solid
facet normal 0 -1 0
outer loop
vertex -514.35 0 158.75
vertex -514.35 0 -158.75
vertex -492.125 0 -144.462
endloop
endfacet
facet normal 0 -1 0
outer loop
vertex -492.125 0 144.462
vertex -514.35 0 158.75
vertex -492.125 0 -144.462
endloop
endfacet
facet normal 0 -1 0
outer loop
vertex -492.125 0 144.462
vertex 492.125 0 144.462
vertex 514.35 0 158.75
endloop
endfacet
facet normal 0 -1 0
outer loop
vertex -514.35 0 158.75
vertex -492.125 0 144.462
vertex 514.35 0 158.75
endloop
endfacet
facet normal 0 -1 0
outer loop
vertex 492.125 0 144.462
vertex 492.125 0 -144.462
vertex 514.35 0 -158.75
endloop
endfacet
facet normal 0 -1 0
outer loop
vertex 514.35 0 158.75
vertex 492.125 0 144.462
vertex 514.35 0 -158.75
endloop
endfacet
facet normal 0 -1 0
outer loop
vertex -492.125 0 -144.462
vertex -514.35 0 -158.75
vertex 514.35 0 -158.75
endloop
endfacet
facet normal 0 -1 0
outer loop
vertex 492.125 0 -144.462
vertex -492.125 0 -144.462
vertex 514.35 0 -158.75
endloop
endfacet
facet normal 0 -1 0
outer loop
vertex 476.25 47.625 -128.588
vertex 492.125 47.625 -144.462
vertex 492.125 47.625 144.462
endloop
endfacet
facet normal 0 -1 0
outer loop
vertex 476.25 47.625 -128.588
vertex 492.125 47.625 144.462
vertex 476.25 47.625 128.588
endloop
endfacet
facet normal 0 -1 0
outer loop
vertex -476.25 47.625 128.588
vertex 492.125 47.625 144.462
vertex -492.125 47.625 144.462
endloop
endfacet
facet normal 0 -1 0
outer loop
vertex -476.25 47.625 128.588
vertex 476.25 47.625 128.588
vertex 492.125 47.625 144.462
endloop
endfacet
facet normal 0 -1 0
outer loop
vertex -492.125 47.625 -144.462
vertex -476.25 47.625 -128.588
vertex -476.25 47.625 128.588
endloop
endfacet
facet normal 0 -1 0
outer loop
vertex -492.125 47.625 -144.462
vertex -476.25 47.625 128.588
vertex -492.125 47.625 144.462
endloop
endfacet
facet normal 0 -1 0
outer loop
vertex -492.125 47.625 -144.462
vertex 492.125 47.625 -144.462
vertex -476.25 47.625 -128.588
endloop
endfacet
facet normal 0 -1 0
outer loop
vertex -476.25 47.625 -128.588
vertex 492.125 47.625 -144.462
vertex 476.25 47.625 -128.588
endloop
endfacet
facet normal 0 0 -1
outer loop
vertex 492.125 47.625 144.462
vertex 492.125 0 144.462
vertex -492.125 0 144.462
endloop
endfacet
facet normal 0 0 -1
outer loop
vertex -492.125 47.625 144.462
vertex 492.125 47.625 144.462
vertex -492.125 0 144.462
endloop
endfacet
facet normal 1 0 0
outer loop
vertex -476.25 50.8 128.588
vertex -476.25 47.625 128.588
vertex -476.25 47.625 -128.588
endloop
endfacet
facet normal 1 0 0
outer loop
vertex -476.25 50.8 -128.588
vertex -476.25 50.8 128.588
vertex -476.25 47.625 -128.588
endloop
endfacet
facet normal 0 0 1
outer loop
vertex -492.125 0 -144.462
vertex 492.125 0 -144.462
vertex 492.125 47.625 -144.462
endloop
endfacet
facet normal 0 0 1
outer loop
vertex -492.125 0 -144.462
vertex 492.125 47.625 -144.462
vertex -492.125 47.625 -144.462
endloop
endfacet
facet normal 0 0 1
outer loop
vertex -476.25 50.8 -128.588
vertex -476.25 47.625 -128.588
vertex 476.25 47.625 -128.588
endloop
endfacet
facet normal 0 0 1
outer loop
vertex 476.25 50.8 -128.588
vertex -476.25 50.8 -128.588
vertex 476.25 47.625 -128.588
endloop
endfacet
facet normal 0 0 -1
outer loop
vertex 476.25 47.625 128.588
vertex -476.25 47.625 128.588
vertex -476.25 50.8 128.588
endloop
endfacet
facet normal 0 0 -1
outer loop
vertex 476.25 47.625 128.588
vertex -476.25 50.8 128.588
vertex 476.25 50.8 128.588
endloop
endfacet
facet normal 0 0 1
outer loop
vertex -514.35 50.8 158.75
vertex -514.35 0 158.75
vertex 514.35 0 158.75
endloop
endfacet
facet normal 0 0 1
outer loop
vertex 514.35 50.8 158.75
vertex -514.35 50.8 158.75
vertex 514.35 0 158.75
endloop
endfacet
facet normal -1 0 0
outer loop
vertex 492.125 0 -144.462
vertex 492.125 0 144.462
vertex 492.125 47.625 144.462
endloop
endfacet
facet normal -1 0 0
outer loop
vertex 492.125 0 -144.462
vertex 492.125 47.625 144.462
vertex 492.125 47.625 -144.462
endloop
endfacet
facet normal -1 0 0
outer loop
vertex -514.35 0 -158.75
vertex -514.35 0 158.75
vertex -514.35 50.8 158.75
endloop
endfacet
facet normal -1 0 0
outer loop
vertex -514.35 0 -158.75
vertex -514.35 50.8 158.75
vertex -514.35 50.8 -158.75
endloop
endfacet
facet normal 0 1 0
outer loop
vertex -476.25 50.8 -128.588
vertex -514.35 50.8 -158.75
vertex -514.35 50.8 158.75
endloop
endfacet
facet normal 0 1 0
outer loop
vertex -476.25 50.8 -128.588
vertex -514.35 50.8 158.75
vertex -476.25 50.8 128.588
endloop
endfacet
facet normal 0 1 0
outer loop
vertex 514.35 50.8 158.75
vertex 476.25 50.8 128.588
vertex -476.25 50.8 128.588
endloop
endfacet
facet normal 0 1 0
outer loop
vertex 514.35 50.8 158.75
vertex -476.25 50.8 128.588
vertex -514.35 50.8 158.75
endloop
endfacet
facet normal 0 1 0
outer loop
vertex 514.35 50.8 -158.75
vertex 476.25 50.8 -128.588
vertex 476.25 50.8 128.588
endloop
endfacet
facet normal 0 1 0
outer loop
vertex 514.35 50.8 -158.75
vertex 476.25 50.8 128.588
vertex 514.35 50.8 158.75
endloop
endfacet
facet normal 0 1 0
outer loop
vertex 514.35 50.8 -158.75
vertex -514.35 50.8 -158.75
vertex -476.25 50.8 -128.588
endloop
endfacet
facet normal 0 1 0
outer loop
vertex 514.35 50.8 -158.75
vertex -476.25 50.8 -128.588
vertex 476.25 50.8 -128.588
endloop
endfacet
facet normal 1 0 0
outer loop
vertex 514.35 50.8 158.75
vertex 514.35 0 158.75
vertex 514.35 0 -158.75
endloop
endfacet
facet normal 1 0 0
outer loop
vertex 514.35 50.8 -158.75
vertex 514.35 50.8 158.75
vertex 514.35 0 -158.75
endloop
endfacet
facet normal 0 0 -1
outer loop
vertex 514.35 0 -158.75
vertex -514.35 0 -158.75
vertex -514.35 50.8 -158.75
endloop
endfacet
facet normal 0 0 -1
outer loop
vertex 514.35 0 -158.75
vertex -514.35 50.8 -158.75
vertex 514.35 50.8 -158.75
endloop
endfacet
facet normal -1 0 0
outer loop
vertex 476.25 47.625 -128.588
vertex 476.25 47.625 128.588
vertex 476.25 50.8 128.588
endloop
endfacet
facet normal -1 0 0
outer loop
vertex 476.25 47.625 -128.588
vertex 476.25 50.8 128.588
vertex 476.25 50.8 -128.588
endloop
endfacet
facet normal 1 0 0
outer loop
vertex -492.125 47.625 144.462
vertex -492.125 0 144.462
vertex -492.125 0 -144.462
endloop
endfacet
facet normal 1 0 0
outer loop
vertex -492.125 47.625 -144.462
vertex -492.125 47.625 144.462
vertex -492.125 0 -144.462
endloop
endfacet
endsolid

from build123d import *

# Parameters (mm, degrees)
CROQUIS1_W              = 1028.7
CROQUIS1_H              = 317.5
SALIENTE_EXTRUIR1_DEPTH = 50.8
CROQUIS6_W              = 984.25
CROQUIS6_H              = 288.925
CORTAR_EXTRUIR6_DEPTH   = 47.625
CROQUIS1_4_W            = 895.35
CROQUIS1_4_H            = 200.025
CORTAR_EXTRUIR1_DEPTH   = 541.683017118
CROQUIS7_W              = 952.5
CROQUIS7_H              = 257.175
CORTAR_EXTRUIR7_DEPTH   = 541.683017118


with BuildPart() as part:
    # Croquis1 → Saliente-Extruir1 (new body)
    with BuildSketch(Plane(origin=(0, 0, 0), x_dir=(1, 0, 0), z_dir=(0, 1, 0))):
        Rectangle(CROQUIS1_W, CROQUIS1_H)
    extrude(amount=SALIENTE_EXTRUIR1_DEPTH)

    # Croquis6 → Cortar-Extruir6 (cut)
    with BuildSketch(Plane(origin=(0, 0, 0), x_dir=(-1, 0, 0), z_dir=(0, -1, 0))):
        Rectangle(CROQUIS6_W, CROQUIS6_H)
    extrude(amount=-CORTAR_EXTRUIR6_DEPTH, mode=Mode.SUBTRACT)

    # Croquis1<4> → Cortar-Extruir1 (cut, through all)
    with BuildSketch(Plane(origin=(0, 0, 0), x_dir=(1, 0, 0), z_dir=(0, 1, 0))):
        Rectangle(CROQUIS1_4_W, CROQUIS1_4_H)
    extrude(amount=CORTAR_EXTRUIR1_DEPTH, mode=Mode.SUBTRACT)

    # Croquis7 → Cortar-Extruir7 (cut, through all)
    with BuildSketch(Plane(origin=(0, 50.8, 0), x_dir=(1, 0, 0), z_dir=(0, 1, 0))):
        Rectangle(CROQUIS7_W, CROQUIS7_H)
    extrude(amount=-CORTAR_EXTRUIR7_DEPTH, mode=Mode.SUBTRACT)


solid = part.part
